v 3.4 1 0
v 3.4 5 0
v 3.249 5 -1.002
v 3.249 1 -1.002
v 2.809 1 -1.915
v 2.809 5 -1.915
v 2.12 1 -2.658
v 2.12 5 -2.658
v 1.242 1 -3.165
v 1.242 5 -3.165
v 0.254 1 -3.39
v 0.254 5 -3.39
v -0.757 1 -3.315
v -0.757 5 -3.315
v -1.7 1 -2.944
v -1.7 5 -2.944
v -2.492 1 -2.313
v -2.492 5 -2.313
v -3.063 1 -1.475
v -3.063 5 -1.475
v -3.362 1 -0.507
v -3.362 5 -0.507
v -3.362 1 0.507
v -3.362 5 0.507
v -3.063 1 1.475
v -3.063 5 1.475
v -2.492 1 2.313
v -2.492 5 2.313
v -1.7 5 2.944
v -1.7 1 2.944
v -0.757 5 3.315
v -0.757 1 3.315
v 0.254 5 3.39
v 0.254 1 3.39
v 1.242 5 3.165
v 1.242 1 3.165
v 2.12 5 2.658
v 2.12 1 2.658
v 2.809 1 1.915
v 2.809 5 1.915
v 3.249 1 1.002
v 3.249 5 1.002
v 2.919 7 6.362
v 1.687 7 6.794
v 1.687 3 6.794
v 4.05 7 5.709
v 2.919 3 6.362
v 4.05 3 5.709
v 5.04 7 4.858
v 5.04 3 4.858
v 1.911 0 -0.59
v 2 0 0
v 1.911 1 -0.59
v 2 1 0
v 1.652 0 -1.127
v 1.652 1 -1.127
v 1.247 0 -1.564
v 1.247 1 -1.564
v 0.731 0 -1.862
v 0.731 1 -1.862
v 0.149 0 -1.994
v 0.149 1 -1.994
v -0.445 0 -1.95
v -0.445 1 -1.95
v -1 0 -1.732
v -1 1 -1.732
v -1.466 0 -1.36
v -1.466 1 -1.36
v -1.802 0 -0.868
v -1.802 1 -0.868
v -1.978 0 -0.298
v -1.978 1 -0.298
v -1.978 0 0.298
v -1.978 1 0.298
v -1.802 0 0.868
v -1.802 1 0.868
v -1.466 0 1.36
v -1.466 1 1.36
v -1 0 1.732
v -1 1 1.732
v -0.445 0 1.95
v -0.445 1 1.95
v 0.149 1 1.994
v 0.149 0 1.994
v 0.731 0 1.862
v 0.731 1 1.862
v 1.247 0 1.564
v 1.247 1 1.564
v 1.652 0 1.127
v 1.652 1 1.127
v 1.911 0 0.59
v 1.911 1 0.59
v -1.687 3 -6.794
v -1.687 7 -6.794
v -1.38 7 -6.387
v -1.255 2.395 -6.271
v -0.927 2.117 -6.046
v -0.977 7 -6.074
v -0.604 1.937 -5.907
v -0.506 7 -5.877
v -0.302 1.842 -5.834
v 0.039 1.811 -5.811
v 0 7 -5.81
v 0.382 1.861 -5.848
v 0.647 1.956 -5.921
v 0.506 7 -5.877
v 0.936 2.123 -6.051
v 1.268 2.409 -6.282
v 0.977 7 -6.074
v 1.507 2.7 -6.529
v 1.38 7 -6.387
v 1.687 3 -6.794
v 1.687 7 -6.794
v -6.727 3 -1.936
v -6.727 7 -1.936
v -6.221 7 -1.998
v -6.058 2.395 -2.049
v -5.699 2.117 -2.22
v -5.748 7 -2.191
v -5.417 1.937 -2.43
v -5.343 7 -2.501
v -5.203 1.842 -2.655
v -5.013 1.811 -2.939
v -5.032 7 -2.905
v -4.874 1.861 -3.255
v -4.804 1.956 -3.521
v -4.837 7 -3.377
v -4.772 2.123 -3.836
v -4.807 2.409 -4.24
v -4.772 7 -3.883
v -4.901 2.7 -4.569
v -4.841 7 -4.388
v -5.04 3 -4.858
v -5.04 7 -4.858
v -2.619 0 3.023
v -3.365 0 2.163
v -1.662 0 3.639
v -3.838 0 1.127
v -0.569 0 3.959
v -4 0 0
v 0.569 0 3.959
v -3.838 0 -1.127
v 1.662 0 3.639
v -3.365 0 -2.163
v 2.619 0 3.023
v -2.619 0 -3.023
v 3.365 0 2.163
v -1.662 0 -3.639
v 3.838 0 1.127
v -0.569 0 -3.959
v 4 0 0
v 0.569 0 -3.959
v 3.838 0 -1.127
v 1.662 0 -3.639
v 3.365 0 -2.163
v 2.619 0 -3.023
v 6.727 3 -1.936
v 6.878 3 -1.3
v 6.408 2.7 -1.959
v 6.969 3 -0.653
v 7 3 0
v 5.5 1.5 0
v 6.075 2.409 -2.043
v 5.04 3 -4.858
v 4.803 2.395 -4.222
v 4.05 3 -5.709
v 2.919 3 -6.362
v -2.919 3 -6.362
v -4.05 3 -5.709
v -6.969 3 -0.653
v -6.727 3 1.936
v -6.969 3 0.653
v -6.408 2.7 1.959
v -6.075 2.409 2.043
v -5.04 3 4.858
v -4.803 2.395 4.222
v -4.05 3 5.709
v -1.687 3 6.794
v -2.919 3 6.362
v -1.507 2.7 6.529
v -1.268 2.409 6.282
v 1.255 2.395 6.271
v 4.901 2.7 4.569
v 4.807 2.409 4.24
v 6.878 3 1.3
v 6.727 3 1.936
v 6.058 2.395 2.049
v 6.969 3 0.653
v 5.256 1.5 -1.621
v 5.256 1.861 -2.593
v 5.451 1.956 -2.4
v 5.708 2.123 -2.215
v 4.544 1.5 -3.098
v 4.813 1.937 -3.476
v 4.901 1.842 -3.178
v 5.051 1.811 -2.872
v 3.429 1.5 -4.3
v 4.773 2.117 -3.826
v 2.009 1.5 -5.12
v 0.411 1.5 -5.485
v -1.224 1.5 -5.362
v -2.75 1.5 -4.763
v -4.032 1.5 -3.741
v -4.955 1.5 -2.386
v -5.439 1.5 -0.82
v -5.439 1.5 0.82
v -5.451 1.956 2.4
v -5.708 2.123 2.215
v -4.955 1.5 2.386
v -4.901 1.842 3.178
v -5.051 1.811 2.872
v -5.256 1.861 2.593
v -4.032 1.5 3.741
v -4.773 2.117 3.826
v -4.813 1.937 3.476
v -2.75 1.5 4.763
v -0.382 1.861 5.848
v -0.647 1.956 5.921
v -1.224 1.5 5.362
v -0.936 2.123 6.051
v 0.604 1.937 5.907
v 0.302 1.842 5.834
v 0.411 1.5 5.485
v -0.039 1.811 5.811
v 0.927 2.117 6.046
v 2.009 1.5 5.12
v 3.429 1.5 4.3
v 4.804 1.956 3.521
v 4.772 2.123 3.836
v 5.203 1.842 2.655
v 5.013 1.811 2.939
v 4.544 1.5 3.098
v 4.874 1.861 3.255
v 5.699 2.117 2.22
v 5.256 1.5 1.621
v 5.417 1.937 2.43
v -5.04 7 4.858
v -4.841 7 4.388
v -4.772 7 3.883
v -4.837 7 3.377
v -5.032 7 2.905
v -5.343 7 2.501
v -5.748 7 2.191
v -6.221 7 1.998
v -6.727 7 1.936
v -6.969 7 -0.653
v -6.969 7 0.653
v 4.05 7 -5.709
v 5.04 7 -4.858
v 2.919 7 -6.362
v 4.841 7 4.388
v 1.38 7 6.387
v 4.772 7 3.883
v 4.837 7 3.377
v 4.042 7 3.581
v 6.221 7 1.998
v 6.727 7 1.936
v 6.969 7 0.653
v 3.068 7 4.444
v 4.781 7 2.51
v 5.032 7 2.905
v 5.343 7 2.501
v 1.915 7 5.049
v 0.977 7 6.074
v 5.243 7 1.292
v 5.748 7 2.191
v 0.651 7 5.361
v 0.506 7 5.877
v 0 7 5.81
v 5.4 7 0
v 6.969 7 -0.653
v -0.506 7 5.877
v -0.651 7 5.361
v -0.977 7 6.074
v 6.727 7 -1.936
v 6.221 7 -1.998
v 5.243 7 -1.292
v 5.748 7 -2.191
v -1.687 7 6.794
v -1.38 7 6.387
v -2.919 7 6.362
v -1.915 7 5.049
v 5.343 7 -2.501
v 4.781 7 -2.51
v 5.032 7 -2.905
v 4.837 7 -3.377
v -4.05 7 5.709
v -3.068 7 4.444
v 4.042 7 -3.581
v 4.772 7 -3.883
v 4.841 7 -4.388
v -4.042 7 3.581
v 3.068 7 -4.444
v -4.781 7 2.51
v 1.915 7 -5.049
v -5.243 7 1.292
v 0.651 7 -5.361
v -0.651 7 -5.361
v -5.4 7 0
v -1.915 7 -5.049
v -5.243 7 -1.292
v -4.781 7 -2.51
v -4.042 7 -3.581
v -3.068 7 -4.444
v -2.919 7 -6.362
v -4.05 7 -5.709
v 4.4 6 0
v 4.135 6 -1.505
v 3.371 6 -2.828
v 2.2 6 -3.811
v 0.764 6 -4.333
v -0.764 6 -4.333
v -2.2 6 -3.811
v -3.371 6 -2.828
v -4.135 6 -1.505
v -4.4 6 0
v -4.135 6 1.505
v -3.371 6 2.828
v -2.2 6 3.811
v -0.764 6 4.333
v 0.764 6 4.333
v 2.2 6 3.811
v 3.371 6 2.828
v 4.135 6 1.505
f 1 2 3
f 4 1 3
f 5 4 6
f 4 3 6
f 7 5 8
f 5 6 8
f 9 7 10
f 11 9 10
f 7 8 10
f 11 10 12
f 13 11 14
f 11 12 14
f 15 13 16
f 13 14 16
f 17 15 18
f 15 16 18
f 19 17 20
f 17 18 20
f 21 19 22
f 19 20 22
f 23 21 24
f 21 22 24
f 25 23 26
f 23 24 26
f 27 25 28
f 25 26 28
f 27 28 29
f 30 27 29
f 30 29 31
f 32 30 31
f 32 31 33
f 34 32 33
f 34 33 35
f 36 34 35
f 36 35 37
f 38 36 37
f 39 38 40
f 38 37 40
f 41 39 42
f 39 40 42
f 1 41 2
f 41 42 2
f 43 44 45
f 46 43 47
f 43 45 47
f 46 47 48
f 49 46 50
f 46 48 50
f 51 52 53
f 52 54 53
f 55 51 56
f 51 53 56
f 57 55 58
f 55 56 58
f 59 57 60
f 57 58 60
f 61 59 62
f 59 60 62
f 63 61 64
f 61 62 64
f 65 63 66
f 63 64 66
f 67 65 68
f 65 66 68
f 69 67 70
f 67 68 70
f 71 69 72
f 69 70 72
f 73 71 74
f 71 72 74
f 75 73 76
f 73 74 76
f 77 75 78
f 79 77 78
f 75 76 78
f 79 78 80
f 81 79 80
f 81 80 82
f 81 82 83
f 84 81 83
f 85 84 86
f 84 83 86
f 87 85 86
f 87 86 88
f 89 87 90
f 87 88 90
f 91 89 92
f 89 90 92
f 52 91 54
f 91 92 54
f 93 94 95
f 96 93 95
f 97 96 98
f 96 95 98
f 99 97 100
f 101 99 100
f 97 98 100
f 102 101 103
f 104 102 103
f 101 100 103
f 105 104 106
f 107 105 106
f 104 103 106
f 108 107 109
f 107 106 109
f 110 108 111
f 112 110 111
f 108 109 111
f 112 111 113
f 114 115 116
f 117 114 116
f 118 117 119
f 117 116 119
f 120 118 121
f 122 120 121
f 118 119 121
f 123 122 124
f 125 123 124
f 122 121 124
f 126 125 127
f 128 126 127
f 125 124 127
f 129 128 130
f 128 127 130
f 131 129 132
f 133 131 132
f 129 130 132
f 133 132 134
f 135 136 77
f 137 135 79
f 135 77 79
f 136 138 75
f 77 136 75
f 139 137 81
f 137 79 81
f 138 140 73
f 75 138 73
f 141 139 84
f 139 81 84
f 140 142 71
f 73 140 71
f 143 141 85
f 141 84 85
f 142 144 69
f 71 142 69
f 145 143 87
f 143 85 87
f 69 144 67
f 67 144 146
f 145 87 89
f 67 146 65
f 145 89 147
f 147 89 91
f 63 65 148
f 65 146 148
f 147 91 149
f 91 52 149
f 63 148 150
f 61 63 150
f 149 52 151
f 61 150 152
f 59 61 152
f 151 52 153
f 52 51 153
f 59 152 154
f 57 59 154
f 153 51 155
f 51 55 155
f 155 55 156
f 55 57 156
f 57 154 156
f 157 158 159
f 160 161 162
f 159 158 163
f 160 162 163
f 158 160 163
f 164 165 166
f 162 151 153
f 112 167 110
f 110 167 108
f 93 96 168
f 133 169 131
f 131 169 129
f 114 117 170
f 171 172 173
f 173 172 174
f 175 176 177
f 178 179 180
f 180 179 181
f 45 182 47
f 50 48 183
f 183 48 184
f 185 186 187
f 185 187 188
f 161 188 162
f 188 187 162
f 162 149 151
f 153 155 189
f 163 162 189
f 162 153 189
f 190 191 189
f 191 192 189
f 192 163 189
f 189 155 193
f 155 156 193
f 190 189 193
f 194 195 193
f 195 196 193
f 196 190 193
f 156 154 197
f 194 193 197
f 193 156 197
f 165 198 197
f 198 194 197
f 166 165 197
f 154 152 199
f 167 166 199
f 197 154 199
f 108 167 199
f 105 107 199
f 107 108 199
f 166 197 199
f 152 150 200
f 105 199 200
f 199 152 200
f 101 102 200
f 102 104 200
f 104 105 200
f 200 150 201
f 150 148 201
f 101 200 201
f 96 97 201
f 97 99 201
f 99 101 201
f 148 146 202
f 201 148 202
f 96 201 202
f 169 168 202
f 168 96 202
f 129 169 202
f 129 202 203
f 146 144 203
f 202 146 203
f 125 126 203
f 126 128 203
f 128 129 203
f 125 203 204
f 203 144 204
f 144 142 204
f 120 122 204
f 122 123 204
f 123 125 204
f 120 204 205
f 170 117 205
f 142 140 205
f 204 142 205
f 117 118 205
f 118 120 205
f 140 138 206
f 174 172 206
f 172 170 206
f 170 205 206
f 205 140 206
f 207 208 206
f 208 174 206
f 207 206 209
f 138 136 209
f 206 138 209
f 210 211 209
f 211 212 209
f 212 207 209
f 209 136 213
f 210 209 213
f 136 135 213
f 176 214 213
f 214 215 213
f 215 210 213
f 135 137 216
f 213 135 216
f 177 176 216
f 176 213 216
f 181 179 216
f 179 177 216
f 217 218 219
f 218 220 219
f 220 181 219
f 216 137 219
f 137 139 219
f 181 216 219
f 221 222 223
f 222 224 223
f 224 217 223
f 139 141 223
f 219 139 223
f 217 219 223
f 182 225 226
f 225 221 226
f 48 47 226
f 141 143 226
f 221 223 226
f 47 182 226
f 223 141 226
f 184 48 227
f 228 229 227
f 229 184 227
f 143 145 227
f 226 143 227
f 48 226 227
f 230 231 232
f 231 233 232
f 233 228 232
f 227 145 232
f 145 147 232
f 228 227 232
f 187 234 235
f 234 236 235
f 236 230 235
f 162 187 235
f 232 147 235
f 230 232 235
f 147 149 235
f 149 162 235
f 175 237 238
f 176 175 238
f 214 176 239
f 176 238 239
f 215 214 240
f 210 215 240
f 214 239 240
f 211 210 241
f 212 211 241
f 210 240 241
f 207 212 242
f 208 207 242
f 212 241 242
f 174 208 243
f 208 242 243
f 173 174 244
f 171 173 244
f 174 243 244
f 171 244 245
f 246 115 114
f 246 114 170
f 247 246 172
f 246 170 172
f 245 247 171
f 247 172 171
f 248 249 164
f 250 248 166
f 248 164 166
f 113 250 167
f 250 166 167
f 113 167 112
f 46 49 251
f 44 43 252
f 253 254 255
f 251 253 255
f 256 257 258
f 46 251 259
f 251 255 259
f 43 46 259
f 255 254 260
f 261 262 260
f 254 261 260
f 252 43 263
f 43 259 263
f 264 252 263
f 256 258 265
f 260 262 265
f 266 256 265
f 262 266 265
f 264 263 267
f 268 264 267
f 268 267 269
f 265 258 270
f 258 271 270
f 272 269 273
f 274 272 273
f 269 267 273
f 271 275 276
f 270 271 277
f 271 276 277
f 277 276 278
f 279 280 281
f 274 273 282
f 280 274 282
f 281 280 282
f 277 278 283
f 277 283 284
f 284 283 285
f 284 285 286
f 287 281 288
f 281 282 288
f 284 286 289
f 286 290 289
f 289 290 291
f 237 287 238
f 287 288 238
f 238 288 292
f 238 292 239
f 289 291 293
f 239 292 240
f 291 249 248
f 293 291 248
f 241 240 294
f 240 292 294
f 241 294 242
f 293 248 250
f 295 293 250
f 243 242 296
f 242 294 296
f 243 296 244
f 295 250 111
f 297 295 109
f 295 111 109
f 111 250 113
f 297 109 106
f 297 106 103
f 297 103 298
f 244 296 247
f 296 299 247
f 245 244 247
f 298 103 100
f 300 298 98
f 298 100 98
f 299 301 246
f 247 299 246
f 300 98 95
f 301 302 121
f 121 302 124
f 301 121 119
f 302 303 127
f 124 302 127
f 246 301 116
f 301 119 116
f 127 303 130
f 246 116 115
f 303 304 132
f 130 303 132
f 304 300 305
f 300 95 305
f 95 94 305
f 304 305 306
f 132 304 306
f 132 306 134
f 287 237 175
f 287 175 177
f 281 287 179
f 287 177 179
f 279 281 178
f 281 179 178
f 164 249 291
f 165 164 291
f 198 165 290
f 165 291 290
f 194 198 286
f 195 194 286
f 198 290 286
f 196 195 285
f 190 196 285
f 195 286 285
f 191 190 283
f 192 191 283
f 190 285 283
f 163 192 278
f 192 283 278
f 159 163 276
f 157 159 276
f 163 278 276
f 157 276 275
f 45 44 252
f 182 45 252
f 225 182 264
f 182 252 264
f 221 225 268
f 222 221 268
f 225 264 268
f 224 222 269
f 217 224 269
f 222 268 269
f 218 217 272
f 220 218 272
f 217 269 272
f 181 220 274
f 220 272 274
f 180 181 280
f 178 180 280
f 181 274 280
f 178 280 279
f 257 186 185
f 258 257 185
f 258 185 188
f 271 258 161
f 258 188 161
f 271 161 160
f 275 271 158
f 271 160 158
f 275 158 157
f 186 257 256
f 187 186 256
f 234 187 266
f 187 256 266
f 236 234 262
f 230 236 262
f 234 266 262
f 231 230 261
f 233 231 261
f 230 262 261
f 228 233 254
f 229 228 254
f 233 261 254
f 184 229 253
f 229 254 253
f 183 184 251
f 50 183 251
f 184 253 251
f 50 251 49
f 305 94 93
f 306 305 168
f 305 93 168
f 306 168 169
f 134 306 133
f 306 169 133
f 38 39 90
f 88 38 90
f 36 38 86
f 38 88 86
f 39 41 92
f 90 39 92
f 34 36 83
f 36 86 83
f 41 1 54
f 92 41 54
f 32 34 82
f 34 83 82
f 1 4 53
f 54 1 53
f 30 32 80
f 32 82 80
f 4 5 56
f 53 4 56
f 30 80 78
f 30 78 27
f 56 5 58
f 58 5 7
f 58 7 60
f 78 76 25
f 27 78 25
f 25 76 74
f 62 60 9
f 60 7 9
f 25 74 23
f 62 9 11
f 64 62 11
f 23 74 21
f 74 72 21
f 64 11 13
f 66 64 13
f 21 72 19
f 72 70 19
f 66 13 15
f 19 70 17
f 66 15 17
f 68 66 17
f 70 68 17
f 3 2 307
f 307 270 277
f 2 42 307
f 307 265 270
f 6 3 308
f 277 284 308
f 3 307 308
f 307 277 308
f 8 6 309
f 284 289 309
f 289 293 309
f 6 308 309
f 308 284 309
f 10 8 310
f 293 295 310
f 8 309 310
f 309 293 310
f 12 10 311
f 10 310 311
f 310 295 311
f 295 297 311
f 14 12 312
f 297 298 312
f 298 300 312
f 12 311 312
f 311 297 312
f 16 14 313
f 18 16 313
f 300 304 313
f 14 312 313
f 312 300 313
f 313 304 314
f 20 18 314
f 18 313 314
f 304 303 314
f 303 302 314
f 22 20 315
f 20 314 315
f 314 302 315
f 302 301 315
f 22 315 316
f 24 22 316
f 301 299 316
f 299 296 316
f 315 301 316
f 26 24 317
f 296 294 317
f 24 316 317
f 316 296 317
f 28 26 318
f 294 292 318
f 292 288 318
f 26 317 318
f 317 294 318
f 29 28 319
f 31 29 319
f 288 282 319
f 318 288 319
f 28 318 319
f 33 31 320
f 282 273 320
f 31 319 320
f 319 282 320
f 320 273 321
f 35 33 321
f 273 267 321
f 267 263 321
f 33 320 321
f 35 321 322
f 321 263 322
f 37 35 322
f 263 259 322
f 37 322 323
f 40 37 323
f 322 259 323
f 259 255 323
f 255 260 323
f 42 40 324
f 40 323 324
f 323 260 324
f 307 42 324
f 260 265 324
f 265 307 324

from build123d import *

# Parameters (mm, degrees)
CHAMFER_SIZE       = 2
SKETCH003_R        = 1.939156
POCKET001_DEPTH    = 49.001
POLARPATTERN_COUNT = 6


with BuildPart() as part:
    # Sketch002 → Revolution (revolve)
    with BuildSketch(Plane.XY):
        Polygon((2, 0), (2, 1), (3.4, 1), (3.4, 7), (7, 7), (7, 3), (4, 0), align=None)
    revolve(axis=Axis((0, 0, 0), (0, 1, 0)))

    # Chamfer
    chamfer_edges = [part.edges().sort_by_distance(p)[0] for p in [
        (-3.4, 7, 0),
    ]]
    chamfer(chamfer_edges, length=CHAMFER_SIZE)

    # Sketch003 (on Face4 of Chamfer) → Pocket001 (cut, through all)
    with BuildSketch(Plane(origin=(0, 7, 0), x_dir=(-1, 0, 0), z_dir=(0, 1, 0))):
        with Locations((0, 7.749273)):
            Circle(SKETCH003_R)
    pocket001 = extrude(amount=-POCKET001_DEPTH, mode=Mode.SUBTRACT)

    # PolarPattern: Pocket001 ×6 about axis
    polarpattern_axis = Axis((0, 7, 0), (0, 1, 0))
    for i in range(1, POLARPATTERN_COUNT):
        add(pocket001.rotate(polarpattern_axis, i * 360 / POLARPATTERN_COUNT), mode=Mode.SUBTRACT)


solid = part.part
